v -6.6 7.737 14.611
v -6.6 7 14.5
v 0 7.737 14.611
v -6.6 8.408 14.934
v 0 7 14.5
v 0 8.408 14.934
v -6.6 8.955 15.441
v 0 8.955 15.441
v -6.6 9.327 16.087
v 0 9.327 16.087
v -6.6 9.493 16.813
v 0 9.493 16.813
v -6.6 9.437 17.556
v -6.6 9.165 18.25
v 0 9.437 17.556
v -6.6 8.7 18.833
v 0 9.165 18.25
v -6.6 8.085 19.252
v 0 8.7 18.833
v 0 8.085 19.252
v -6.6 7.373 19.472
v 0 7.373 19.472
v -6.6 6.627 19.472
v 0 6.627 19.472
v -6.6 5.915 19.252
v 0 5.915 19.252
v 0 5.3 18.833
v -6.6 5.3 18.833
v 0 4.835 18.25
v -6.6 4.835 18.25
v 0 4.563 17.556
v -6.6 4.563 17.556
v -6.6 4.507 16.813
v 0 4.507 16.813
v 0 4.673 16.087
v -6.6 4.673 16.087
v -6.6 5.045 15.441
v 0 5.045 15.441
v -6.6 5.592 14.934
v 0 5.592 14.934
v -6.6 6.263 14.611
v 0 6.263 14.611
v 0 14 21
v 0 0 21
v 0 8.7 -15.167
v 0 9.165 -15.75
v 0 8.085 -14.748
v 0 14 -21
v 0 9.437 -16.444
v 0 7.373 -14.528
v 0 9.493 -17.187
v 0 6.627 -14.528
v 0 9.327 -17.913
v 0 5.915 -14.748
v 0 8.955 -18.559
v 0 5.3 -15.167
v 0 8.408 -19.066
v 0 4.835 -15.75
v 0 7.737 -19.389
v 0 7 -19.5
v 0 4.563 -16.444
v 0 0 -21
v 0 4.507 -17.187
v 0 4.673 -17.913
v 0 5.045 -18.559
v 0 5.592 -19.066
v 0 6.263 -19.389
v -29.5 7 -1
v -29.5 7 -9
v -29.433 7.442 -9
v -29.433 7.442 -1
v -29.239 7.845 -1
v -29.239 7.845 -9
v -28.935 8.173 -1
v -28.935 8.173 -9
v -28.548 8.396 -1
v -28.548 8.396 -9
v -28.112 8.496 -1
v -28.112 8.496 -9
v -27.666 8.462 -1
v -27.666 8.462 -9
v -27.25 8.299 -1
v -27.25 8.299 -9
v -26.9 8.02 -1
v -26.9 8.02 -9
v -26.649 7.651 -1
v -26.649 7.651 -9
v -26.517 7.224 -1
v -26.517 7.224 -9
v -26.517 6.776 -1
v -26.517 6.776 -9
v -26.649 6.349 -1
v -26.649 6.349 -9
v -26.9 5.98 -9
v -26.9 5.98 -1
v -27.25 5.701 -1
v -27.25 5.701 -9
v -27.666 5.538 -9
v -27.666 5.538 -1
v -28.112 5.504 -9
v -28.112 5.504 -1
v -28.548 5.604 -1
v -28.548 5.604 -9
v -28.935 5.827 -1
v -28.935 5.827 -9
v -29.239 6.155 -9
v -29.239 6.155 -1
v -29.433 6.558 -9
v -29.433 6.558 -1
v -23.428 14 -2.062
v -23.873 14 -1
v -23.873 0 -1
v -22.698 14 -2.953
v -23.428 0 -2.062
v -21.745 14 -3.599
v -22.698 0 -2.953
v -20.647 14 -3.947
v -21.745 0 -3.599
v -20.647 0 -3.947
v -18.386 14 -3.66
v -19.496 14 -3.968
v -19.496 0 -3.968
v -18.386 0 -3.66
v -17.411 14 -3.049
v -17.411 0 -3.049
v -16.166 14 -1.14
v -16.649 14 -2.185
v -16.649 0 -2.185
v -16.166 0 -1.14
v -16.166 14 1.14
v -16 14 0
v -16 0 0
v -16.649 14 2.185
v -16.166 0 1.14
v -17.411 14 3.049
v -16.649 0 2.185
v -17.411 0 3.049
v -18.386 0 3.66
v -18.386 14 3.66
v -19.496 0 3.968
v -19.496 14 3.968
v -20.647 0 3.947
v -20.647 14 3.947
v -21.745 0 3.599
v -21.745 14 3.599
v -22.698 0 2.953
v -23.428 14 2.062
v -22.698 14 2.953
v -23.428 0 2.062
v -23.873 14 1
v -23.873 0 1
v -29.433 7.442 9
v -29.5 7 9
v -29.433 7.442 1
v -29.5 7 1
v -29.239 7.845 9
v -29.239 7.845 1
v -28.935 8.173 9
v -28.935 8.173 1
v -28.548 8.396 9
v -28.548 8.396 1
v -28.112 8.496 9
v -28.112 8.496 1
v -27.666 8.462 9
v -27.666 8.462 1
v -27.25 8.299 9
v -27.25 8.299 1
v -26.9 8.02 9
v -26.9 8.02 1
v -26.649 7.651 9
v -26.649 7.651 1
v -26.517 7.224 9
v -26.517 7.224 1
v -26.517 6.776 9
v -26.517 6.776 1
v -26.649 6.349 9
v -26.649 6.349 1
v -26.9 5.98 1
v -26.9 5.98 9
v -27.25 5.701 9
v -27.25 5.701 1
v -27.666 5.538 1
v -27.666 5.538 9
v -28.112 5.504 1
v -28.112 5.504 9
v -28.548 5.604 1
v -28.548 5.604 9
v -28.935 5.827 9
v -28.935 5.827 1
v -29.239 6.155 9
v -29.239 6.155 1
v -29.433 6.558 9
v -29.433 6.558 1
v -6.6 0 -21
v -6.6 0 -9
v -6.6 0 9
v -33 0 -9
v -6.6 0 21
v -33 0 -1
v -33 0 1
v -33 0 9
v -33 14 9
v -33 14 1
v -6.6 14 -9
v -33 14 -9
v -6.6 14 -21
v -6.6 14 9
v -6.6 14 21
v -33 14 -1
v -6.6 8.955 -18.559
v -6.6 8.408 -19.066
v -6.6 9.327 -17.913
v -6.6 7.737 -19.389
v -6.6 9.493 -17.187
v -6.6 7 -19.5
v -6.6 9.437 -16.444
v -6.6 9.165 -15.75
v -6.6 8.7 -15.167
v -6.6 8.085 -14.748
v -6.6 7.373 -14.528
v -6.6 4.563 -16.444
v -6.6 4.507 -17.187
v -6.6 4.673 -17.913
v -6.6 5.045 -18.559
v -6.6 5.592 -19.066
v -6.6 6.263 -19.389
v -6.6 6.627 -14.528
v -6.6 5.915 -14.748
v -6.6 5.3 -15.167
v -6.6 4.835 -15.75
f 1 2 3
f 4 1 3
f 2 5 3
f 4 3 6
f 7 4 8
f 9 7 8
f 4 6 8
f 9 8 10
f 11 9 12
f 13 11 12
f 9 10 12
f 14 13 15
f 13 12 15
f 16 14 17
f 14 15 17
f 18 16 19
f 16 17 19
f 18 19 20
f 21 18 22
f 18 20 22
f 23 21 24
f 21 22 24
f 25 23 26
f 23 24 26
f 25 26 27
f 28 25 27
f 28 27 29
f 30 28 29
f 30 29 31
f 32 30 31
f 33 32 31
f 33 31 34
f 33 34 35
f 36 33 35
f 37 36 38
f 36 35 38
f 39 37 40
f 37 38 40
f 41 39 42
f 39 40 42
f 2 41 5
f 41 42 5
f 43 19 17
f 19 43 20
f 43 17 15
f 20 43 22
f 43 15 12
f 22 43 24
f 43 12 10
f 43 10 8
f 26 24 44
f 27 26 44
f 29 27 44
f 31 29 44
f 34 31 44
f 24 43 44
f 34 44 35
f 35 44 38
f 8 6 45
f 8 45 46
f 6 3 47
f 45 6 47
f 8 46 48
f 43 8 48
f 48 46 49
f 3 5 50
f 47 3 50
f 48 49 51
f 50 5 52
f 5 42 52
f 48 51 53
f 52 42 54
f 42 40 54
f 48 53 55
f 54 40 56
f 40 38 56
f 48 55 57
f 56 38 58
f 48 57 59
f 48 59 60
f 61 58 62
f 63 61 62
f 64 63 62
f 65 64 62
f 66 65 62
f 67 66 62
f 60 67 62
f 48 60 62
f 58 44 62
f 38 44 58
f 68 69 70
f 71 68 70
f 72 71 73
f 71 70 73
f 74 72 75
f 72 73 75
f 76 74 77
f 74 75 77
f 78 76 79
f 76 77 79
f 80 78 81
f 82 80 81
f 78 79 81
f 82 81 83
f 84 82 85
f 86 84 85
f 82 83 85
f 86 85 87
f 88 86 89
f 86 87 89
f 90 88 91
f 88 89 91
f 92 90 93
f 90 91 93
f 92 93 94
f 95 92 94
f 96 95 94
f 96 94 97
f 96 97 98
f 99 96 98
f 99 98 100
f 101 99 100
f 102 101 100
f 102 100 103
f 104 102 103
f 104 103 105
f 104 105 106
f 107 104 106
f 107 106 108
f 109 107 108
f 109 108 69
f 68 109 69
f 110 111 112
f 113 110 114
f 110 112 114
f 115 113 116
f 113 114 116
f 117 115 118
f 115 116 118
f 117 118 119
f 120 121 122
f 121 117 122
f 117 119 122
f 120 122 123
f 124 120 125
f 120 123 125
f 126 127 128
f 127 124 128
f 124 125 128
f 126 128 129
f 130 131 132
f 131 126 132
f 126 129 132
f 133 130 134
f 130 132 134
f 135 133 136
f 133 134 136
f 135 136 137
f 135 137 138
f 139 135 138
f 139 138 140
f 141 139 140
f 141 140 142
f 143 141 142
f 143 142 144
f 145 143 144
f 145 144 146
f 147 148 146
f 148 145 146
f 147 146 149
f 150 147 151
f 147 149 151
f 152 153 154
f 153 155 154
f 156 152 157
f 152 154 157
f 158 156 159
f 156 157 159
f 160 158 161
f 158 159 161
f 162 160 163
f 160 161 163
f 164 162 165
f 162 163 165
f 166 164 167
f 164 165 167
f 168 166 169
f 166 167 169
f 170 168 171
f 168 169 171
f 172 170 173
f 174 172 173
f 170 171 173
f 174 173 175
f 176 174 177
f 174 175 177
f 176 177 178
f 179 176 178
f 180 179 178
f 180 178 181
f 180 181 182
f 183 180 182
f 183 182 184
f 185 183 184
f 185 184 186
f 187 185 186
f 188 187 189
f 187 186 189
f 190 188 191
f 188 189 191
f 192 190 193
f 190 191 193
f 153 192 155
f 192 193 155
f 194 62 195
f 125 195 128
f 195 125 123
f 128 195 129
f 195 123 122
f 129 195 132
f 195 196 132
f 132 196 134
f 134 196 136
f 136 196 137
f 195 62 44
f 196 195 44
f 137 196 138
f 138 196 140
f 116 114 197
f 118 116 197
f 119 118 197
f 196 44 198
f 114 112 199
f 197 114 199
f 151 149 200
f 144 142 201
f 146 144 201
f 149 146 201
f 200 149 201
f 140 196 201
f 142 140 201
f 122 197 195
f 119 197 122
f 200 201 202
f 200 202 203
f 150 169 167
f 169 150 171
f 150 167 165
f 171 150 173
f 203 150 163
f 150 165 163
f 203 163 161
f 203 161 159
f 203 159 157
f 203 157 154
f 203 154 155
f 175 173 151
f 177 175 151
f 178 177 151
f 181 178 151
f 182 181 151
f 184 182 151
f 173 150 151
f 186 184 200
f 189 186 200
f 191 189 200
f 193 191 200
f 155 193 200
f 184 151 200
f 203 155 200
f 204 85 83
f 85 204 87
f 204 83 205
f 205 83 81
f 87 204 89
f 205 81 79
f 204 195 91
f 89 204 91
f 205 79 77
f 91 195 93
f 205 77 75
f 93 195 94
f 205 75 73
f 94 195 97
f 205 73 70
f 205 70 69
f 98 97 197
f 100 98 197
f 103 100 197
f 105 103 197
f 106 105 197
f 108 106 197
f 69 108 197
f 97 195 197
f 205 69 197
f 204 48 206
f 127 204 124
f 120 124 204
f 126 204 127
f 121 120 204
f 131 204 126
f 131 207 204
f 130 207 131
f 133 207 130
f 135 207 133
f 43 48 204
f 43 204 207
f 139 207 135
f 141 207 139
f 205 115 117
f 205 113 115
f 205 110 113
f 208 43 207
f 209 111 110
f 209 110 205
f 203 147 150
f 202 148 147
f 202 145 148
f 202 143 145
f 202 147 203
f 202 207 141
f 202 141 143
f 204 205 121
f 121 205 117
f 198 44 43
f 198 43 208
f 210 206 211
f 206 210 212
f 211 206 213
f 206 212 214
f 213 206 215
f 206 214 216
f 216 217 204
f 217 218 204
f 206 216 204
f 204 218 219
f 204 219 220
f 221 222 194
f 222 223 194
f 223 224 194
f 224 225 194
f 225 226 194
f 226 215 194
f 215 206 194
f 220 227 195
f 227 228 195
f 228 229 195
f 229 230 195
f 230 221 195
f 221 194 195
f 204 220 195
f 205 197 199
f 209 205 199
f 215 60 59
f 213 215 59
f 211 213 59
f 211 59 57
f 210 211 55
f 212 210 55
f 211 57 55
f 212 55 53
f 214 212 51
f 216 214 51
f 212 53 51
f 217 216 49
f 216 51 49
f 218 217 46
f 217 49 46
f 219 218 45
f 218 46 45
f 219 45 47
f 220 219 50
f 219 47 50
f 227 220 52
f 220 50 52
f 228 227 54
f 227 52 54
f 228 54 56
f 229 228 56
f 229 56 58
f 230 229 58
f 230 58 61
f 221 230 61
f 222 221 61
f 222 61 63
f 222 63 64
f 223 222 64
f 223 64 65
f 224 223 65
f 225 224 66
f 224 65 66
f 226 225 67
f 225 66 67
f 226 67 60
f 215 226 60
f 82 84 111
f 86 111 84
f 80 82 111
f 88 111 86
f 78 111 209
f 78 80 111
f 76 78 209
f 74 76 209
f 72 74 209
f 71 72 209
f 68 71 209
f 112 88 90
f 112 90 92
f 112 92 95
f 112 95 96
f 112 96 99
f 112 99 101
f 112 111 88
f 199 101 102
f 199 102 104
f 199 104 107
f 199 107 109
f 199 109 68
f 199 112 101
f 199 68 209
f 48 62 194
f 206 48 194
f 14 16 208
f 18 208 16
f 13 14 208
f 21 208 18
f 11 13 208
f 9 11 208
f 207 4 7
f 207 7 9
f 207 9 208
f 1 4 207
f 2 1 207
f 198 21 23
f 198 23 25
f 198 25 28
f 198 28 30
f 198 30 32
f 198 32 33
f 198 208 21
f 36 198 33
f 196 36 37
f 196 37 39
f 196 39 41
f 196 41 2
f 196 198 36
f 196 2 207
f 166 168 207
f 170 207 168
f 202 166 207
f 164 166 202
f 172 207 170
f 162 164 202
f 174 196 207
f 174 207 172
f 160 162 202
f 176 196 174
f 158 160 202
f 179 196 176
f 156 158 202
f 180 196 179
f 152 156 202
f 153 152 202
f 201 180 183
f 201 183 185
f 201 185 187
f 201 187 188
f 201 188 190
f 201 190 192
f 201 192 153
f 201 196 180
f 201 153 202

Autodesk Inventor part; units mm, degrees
ref_plane "YZ Plane" through (0, 0, 0) normal (1, 0, 0) x (0, 1, 0)
ref_plane "XZ Plane" through (0, 0, 0) normal (0, 1, 0) x (-1, 0, 0)
ref_plane "XY Plane" through (0, 0, 0) normal (0, 0, 1) x (1, 0, 0)
sketch "Sketch1" plane through (0, 0, 0) normal (0, 1, 0) x (-1, 0, 0)
  line L0 (16, 0) -> (0, 0)
  line L1 (0, 0) -> (0, -21)
  line L2 (0, -21) -> (6.6, -21)
  line L3 (6.6, -21) -> (6.6, -9)
  line L4 (6.6, -9) -> (33, -9)
  line L5 (33, -9) -> (33, -1)
  circle A0 centre (20, 0) radius 4
  line L6 (23.873, -1) -> (33, -1)
  line L7 (0, 0) -> (0, 21)
  line L8 (0, 21) -> (6.6, 21)
  line L9 (6.6, 21) -> (6.6, 9)
  line L10 (6.6, 9) -> (33, 9)
  line L11 (33, 9) -> (33, 1)
  circle A1 centre (20, 0) radius 4
  line L12 (23.873, 1) -> (33, 1)
  dimension "d0" = 6.6
  dimension "d1" = 21
  dimension "d2" = 1
  dimension "d3" = 9
  dimension "d4" = 8
  dimension "d5" = 33
  dimension "d19" = 20
extrude "Extrusion1" add sketch "Sketch1" along normal blind 14 contours A0 L6 L5 L4 L3 L2 L1 L0 | L0 L7 L8 L9 L10 L11 L12 A0
sketch "Sketch2" plane through (0, 0, 21) normal (1, 0, 0) x (0, 0, -1)
  circle A0 centre (38, 7) radius 2.5
  line L0 (21, 26.3461) -> (21, -5.4737) construction
  line L1 (0, 14) -> (42, 14) projected
  line L2 (42, 0) -> (42, 14) projected
  circle A1 centre (4, 7) radius 2.5
  point P0 (21, 0)
  point P1 (21, 14)
  point P2 (42, 7)
  dimension "d10" = 5
  dimension "d14" = 4
extrude "Extrusion2" cut sketch "Sketch2" against normal blind 14
sketch "Sketch3" plane through (-6.6, 0, -9) normal (0, 0, -1) x (-1, 0, 0)
  circle A0 centre (21.4, 7) radius 1.5
  line L0 (26.4, 0) -> (26.4, 14) projected
  point P0 (-6.6, 0)
  point P1 (26.4, 7)
  dimension "d15" = 3
  dimension "d16" = 5
extrude "Extrusion3" cut sketch "Sketch3" against normal up to surface (18 mm away)
equation "\"d17\" = d15"
properties part number "Shaft support - Stock"
